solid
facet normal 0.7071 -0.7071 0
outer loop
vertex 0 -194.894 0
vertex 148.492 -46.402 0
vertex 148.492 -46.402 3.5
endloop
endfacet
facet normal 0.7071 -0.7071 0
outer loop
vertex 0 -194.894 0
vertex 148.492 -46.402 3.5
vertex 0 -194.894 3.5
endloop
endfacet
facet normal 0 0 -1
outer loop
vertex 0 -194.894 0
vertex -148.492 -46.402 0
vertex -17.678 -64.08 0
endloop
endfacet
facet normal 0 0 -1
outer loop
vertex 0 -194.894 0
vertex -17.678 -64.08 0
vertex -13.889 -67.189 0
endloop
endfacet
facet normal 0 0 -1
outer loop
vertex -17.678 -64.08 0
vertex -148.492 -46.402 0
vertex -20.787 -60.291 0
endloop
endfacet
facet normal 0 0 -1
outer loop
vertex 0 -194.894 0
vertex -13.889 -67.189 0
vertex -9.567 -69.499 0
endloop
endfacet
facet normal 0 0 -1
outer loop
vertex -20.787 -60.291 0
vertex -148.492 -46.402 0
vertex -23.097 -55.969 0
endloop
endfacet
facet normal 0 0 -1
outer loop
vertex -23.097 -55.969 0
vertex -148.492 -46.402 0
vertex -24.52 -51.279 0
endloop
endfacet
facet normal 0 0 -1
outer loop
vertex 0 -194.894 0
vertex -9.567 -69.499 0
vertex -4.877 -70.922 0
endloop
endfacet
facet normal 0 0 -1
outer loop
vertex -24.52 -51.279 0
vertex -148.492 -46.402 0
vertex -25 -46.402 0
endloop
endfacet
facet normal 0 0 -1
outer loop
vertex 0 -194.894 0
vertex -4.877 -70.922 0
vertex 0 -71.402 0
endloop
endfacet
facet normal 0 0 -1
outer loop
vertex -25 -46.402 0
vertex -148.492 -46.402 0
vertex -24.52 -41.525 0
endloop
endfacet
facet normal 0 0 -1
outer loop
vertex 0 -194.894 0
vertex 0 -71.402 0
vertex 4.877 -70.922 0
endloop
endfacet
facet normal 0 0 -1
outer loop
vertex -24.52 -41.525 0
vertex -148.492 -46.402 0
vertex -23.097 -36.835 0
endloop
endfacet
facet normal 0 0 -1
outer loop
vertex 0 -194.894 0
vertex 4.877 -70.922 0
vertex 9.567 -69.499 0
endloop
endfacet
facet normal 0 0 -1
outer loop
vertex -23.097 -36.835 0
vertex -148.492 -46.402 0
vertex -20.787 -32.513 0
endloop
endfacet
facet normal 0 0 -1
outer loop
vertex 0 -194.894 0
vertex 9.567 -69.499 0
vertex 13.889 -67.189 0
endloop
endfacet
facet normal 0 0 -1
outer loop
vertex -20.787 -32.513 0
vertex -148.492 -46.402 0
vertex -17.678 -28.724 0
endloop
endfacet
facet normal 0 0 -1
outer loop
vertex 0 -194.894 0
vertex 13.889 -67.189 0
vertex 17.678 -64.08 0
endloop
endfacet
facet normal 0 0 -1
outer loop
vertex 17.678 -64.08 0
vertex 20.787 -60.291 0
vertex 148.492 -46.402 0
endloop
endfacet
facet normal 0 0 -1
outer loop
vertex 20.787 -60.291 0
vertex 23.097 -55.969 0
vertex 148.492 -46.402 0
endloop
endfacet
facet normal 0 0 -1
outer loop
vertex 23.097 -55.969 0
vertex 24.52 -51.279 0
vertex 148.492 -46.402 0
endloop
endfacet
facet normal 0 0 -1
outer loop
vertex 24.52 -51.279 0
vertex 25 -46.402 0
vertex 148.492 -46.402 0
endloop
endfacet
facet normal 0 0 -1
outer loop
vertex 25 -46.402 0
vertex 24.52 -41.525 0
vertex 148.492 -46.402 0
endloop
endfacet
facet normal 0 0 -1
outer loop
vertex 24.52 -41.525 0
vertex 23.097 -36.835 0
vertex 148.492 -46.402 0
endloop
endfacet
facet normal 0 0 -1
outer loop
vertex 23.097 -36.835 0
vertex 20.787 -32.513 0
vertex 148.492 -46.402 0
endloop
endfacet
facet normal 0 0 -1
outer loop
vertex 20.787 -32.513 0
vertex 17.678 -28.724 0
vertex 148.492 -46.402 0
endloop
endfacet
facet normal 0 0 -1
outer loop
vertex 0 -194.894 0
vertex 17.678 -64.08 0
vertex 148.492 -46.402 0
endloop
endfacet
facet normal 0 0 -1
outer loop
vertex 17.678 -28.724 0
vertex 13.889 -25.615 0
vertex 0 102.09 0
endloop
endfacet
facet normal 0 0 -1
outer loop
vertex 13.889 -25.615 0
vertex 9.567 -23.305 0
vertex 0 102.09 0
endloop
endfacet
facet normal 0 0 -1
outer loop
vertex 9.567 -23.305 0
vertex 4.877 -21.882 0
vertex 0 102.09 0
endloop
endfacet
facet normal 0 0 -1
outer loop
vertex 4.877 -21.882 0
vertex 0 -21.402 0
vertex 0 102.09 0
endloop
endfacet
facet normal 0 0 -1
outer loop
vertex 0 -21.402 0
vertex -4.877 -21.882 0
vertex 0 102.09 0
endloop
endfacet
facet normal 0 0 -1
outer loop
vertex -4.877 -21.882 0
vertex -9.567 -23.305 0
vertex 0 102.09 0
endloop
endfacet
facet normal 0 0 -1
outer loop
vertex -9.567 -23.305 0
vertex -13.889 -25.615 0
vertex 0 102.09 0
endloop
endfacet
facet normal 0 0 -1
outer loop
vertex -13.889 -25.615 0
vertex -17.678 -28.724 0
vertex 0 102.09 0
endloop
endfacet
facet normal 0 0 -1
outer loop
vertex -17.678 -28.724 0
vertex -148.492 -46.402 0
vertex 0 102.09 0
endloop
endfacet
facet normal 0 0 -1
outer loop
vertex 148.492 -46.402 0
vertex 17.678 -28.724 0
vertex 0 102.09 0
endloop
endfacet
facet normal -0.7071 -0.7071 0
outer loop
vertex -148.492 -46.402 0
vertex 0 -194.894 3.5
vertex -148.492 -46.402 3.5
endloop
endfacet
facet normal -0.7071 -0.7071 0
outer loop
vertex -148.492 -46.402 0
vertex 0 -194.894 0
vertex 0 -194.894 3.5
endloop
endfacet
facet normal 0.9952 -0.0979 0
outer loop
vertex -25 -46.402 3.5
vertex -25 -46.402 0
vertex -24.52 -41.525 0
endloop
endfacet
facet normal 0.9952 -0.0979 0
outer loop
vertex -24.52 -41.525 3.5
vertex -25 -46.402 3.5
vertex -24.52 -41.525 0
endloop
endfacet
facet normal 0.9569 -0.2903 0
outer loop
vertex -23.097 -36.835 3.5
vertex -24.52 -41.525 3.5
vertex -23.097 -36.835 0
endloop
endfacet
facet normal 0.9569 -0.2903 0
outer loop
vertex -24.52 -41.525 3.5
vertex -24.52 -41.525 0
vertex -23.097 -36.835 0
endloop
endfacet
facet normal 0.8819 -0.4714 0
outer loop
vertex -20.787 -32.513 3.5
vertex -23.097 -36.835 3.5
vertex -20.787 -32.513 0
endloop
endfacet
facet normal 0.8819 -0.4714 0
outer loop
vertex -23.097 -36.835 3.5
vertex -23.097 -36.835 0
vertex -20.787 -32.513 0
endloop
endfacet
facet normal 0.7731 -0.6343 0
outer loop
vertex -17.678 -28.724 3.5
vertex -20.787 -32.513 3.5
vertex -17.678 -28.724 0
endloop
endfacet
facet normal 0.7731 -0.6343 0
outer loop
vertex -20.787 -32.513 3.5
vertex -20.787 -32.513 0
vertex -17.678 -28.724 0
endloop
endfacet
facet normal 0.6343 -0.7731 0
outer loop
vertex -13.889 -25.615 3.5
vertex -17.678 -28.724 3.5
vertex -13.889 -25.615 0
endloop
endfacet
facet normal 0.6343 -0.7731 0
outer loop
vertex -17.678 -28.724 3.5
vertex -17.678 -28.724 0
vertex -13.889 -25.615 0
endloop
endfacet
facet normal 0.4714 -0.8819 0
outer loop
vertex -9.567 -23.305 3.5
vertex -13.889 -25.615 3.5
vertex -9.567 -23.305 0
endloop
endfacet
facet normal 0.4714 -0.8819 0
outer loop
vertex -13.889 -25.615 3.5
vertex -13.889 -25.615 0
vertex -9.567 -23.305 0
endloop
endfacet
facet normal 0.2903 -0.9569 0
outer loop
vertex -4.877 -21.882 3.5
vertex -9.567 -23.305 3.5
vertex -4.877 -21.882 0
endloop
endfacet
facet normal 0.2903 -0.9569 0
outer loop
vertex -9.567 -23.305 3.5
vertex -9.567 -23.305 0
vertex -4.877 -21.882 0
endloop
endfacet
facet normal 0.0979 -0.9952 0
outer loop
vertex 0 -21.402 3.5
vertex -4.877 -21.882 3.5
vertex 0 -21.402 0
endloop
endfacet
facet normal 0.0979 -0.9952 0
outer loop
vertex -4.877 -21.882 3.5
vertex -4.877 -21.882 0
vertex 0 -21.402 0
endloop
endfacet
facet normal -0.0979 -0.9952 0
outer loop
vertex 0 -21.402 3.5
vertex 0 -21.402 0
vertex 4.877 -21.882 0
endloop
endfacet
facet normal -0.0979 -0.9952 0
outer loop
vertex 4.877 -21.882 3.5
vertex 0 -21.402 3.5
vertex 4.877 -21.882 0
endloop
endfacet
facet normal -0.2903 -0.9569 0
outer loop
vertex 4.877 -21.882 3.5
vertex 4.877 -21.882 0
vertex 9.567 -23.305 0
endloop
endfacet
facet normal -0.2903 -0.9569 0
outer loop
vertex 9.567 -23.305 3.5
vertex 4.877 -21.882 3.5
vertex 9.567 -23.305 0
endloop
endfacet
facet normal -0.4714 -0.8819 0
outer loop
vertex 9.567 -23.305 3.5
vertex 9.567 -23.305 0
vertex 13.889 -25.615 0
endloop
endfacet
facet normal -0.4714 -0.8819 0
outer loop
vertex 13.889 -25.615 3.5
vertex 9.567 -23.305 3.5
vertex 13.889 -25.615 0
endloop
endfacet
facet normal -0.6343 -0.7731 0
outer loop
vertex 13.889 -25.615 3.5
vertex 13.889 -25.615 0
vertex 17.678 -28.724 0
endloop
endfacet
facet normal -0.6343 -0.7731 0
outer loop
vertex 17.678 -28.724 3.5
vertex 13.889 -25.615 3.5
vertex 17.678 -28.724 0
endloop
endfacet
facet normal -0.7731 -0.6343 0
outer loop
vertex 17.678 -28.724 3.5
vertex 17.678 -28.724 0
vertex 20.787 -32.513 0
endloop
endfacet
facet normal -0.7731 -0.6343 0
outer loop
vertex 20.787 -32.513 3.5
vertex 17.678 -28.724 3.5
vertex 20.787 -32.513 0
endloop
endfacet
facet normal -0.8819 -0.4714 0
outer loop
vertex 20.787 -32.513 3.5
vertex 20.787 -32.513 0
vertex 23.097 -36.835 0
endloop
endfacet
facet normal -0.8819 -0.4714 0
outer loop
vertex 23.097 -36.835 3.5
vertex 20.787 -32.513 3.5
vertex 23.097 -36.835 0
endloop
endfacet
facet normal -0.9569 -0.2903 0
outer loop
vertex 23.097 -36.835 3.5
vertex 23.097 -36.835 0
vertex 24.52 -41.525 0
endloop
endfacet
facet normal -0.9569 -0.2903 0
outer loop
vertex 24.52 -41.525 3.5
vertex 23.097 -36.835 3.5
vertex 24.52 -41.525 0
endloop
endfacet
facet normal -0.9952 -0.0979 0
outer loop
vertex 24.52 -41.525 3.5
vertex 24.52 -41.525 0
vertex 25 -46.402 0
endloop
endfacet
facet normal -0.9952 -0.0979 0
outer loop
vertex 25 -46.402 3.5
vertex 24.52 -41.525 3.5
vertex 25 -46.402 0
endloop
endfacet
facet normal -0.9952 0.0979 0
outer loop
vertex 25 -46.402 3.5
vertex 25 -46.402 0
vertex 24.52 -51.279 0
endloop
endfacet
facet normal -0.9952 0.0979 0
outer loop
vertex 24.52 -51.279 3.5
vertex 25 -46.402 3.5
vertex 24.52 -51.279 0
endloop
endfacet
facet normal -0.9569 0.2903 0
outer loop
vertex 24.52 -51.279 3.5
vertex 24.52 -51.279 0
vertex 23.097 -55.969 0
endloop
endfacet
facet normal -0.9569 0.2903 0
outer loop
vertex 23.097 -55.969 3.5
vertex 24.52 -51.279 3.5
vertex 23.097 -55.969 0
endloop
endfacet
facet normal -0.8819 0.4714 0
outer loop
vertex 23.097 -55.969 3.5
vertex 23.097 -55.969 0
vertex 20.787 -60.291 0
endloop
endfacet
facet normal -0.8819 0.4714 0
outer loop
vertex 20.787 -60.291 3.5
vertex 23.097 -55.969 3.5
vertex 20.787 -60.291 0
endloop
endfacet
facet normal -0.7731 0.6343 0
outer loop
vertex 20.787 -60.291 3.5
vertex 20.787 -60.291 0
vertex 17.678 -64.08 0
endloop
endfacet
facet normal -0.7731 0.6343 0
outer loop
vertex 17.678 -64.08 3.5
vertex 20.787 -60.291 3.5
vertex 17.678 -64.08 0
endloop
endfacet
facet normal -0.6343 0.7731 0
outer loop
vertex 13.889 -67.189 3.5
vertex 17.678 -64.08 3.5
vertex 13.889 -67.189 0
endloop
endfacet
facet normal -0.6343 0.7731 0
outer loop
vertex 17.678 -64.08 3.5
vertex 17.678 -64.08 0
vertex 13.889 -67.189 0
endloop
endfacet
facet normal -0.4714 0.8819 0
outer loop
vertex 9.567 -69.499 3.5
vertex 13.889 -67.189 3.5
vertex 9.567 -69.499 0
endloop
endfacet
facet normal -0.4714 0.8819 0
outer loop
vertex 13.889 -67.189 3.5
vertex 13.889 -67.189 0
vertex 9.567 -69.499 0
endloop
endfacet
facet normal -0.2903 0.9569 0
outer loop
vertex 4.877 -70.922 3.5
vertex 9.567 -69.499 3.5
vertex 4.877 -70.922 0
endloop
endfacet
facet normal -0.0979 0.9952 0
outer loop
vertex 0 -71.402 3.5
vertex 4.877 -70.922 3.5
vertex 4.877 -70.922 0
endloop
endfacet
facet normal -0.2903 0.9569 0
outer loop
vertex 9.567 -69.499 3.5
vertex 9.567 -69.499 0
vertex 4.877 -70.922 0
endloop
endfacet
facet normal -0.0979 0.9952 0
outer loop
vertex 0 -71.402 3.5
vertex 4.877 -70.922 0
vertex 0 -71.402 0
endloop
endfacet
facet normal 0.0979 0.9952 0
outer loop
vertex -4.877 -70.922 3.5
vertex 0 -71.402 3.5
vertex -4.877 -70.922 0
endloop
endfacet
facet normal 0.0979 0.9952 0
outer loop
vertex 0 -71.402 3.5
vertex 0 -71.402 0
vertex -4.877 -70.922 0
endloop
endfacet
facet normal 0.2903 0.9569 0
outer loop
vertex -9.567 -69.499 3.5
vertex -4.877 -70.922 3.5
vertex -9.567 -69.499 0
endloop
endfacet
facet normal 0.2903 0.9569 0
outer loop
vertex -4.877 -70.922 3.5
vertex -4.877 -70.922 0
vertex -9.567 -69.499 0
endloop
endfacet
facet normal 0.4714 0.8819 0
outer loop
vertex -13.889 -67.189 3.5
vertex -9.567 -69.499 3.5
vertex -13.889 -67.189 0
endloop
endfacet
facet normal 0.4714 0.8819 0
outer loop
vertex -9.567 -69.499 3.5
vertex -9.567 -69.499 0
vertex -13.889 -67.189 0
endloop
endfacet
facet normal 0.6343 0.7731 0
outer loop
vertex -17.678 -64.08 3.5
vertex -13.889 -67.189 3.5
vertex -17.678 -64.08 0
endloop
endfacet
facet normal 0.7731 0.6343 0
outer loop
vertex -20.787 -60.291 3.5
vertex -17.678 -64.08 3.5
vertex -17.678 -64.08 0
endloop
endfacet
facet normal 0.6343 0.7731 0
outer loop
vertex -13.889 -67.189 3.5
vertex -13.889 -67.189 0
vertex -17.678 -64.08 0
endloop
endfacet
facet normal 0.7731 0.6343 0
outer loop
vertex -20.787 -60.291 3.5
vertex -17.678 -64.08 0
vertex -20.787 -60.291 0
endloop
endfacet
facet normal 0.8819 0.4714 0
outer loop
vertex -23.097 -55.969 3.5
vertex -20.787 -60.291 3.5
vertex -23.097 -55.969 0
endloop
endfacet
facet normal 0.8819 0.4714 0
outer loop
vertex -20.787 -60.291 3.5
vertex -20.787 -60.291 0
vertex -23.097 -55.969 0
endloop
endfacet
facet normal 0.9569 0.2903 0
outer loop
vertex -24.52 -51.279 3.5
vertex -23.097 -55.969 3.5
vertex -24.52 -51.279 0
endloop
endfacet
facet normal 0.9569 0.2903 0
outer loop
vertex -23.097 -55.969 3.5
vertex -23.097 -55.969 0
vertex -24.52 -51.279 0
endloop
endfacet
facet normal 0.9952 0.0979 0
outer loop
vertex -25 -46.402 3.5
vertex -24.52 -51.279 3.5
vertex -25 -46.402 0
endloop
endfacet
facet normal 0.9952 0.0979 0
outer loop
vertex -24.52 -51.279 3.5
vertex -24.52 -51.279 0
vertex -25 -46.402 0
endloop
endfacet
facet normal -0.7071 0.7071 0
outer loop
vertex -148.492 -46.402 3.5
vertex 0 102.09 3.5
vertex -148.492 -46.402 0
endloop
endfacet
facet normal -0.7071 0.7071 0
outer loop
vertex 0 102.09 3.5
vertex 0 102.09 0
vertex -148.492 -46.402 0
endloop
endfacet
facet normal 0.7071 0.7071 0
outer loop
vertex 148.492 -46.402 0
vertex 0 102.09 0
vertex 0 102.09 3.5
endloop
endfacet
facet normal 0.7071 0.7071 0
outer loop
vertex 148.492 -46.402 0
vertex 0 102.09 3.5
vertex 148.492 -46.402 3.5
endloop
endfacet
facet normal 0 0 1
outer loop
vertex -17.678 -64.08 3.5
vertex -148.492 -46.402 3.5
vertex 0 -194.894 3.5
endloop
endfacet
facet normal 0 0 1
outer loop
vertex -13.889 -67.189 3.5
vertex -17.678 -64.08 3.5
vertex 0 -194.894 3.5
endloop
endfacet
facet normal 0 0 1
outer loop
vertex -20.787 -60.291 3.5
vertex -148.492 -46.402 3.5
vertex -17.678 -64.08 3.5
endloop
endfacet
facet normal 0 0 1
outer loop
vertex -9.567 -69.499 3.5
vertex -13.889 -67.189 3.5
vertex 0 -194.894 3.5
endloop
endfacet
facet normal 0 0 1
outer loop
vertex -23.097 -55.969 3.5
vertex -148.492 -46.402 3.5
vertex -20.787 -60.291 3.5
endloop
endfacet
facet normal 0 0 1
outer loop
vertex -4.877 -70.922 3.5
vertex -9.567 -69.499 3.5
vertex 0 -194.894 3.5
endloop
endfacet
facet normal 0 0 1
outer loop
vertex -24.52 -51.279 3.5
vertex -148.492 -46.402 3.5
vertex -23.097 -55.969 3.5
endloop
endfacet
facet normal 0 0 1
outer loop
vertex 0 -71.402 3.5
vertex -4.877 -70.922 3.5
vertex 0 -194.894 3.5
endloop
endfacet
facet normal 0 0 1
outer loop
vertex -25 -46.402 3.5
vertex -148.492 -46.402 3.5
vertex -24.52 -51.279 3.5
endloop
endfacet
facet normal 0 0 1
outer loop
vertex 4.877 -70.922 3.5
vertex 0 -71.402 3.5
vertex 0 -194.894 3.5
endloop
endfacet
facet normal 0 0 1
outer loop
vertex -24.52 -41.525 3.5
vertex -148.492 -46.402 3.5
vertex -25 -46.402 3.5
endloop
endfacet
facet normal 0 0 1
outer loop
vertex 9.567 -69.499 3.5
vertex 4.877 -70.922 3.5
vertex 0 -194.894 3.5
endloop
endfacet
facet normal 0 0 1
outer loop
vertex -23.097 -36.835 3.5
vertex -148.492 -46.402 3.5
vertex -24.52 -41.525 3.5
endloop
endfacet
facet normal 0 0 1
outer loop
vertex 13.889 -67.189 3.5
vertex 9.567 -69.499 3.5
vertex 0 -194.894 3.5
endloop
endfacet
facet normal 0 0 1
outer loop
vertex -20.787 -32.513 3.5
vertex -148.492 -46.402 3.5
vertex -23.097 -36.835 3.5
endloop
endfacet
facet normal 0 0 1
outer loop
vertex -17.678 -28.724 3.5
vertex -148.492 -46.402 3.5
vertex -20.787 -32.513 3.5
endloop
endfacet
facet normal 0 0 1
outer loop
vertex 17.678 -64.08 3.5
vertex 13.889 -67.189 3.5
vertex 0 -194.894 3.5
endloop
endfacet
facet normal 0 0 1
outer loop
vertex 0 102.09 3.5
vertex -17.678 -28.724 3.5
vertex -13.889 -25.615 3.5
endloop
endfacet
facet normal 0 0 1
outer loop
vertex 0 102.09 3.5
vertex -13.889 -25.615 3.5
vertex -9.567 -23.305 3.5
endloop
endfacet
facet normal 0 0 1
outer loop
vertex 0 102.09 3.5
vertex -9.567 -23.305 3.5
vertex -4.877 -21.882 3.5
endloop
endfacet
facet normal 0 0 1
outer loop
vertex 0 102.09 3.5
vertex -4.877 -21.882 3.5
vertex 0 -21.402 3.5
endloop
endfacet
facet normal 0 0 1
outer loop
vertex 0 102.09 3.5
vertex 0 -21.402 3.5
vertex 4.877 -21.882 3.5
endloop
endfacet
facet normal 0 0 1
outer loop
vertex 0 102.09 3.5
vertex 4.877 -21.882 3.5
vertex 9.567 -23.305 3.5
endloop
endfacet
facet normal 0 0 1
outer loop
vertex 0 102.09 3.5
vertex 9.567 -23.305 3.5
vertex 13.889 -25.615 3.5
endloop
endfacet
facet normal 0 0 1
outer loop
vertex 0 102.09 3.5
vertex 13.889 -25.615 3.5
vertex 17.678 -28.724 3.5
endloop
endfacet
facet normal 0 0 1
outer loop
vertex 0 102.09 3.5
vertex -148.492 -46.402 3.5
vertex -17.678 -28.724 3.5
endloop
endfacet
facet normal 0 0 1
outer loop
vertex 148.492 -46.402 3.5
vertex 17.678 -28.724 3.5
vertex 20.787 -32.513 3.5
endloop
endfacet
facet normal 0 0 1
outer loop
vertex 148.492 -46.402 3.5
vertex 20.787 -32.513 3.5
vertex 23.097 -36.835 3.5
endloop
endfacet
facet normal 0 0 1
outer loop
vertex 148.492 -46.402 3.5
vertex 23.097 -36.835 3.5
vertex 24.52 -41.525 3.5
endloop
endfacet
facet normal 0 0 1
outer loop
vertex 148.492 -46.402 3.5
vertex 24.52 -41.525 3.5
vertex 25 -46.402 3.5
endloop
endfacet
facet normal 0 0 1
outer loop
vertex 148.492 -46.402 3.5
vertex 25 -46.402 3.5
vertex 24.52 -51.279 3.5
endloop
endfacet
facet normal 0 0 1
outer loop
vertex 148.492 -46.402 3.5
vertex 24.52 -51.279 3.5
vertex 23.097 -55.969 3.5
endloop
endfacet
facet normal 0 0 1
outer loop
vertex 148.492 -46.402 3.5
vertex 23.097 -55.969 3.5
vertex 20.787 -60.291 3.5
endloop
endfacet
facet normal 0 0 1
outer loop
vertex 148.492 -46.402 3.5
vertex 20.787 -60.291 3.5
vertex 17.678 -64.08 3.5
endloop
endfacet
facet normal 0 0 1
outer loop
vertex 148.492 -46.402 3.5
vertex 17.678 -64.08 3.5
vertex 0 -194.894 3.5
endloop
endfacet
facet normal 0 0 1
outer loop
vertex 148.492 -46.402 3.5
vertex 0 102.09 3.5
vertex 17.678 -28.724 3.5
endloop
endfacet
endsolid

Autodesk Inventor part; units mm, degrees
ref_plane "YZ Plane" through (0, 0, 0) normal (1, 0, 0) x (0, 1, 0)
ref_plane "XZ Plane" through (0, 0, 0) normal (0, 1, 0) x (-1, 0, 0)
ref_plane "XY Plane" through (0, 0, 0) normal (0, 0, 1) x (1, 0, 0)
sketch "Sketch1" plane through (0, 0, 0) normal (0, 0, 1) x (1, 0, 0)
  line L0 (20, 22.75) -> (-20, 22.75) projected
  line L1 (8, 74.45) -> (-8, 74.45) projected
  line L2 (0, 22.75) -> (0, 133.134)
  line L3 (28.8904, 63.2) -> (28.8904, 73.2) projected
  line L4 (28.8904, 73.2) -> (0, 102.0904)
  line L5 (28.8904, 73.2) -> (69.7476, 73.2) construction
  line L6 (0, 102.0904) -> (-36.5211, 65.5693)
  line L7 (0, 102.0904) -> (148.4924, -46.402)
  line L8 (148.4924, -46.402) -> (0, -194.8944)
  line L9 (0, -194.8944) -> (-148.4924, -46.402)
  line L10 (-148.4924, -46.402) -> (0, 102.0904)
  line L11 (0, 102.0904) -> (210, 102.0904) construction
  point P0 (0, 0)
  dimension "d0" = 135
  dimension "d1" = 90
  dimension "d2" = 210
  dimension "d3" = 45
  dimension "d4" = 210
extrude "Extrusion1" add sketch "Sketch1" along normal blind 3.5
sketch "Sketch2" plane through (0, 0, 0) normal (0, 0, -1) x (-1, 0, 0)
  line L0 (0, 102.0904) -> (148.4924, -46.402) projected
  line L1 (-148.4924, -46.402) -> (0, 102.0904) projected
  line L2 (0, -194.8944) -> (-148.4924, -46.402) projected
  line L3 (148.4924, -46.402) -> (0, -194.8944) projected
  line L4 (-148.4924, -46.402) -> (148.4924, -46.402)
  line L5 (0, -194.8944) -> (0, 102.0904)
  circle A0 centre (0, -46.402) radius 25
  point P0 (0, 0)
  dimension "d8" = 50
extrude "Extrusion2" cut sketch "Sketch2" against normal blind 50 contours A0 L4 L5 | L5 L4 A0 | A0 L5 L4 | L4 L5 A0
equation "\"d9\" = d8"
properties part number "MainBase210"
